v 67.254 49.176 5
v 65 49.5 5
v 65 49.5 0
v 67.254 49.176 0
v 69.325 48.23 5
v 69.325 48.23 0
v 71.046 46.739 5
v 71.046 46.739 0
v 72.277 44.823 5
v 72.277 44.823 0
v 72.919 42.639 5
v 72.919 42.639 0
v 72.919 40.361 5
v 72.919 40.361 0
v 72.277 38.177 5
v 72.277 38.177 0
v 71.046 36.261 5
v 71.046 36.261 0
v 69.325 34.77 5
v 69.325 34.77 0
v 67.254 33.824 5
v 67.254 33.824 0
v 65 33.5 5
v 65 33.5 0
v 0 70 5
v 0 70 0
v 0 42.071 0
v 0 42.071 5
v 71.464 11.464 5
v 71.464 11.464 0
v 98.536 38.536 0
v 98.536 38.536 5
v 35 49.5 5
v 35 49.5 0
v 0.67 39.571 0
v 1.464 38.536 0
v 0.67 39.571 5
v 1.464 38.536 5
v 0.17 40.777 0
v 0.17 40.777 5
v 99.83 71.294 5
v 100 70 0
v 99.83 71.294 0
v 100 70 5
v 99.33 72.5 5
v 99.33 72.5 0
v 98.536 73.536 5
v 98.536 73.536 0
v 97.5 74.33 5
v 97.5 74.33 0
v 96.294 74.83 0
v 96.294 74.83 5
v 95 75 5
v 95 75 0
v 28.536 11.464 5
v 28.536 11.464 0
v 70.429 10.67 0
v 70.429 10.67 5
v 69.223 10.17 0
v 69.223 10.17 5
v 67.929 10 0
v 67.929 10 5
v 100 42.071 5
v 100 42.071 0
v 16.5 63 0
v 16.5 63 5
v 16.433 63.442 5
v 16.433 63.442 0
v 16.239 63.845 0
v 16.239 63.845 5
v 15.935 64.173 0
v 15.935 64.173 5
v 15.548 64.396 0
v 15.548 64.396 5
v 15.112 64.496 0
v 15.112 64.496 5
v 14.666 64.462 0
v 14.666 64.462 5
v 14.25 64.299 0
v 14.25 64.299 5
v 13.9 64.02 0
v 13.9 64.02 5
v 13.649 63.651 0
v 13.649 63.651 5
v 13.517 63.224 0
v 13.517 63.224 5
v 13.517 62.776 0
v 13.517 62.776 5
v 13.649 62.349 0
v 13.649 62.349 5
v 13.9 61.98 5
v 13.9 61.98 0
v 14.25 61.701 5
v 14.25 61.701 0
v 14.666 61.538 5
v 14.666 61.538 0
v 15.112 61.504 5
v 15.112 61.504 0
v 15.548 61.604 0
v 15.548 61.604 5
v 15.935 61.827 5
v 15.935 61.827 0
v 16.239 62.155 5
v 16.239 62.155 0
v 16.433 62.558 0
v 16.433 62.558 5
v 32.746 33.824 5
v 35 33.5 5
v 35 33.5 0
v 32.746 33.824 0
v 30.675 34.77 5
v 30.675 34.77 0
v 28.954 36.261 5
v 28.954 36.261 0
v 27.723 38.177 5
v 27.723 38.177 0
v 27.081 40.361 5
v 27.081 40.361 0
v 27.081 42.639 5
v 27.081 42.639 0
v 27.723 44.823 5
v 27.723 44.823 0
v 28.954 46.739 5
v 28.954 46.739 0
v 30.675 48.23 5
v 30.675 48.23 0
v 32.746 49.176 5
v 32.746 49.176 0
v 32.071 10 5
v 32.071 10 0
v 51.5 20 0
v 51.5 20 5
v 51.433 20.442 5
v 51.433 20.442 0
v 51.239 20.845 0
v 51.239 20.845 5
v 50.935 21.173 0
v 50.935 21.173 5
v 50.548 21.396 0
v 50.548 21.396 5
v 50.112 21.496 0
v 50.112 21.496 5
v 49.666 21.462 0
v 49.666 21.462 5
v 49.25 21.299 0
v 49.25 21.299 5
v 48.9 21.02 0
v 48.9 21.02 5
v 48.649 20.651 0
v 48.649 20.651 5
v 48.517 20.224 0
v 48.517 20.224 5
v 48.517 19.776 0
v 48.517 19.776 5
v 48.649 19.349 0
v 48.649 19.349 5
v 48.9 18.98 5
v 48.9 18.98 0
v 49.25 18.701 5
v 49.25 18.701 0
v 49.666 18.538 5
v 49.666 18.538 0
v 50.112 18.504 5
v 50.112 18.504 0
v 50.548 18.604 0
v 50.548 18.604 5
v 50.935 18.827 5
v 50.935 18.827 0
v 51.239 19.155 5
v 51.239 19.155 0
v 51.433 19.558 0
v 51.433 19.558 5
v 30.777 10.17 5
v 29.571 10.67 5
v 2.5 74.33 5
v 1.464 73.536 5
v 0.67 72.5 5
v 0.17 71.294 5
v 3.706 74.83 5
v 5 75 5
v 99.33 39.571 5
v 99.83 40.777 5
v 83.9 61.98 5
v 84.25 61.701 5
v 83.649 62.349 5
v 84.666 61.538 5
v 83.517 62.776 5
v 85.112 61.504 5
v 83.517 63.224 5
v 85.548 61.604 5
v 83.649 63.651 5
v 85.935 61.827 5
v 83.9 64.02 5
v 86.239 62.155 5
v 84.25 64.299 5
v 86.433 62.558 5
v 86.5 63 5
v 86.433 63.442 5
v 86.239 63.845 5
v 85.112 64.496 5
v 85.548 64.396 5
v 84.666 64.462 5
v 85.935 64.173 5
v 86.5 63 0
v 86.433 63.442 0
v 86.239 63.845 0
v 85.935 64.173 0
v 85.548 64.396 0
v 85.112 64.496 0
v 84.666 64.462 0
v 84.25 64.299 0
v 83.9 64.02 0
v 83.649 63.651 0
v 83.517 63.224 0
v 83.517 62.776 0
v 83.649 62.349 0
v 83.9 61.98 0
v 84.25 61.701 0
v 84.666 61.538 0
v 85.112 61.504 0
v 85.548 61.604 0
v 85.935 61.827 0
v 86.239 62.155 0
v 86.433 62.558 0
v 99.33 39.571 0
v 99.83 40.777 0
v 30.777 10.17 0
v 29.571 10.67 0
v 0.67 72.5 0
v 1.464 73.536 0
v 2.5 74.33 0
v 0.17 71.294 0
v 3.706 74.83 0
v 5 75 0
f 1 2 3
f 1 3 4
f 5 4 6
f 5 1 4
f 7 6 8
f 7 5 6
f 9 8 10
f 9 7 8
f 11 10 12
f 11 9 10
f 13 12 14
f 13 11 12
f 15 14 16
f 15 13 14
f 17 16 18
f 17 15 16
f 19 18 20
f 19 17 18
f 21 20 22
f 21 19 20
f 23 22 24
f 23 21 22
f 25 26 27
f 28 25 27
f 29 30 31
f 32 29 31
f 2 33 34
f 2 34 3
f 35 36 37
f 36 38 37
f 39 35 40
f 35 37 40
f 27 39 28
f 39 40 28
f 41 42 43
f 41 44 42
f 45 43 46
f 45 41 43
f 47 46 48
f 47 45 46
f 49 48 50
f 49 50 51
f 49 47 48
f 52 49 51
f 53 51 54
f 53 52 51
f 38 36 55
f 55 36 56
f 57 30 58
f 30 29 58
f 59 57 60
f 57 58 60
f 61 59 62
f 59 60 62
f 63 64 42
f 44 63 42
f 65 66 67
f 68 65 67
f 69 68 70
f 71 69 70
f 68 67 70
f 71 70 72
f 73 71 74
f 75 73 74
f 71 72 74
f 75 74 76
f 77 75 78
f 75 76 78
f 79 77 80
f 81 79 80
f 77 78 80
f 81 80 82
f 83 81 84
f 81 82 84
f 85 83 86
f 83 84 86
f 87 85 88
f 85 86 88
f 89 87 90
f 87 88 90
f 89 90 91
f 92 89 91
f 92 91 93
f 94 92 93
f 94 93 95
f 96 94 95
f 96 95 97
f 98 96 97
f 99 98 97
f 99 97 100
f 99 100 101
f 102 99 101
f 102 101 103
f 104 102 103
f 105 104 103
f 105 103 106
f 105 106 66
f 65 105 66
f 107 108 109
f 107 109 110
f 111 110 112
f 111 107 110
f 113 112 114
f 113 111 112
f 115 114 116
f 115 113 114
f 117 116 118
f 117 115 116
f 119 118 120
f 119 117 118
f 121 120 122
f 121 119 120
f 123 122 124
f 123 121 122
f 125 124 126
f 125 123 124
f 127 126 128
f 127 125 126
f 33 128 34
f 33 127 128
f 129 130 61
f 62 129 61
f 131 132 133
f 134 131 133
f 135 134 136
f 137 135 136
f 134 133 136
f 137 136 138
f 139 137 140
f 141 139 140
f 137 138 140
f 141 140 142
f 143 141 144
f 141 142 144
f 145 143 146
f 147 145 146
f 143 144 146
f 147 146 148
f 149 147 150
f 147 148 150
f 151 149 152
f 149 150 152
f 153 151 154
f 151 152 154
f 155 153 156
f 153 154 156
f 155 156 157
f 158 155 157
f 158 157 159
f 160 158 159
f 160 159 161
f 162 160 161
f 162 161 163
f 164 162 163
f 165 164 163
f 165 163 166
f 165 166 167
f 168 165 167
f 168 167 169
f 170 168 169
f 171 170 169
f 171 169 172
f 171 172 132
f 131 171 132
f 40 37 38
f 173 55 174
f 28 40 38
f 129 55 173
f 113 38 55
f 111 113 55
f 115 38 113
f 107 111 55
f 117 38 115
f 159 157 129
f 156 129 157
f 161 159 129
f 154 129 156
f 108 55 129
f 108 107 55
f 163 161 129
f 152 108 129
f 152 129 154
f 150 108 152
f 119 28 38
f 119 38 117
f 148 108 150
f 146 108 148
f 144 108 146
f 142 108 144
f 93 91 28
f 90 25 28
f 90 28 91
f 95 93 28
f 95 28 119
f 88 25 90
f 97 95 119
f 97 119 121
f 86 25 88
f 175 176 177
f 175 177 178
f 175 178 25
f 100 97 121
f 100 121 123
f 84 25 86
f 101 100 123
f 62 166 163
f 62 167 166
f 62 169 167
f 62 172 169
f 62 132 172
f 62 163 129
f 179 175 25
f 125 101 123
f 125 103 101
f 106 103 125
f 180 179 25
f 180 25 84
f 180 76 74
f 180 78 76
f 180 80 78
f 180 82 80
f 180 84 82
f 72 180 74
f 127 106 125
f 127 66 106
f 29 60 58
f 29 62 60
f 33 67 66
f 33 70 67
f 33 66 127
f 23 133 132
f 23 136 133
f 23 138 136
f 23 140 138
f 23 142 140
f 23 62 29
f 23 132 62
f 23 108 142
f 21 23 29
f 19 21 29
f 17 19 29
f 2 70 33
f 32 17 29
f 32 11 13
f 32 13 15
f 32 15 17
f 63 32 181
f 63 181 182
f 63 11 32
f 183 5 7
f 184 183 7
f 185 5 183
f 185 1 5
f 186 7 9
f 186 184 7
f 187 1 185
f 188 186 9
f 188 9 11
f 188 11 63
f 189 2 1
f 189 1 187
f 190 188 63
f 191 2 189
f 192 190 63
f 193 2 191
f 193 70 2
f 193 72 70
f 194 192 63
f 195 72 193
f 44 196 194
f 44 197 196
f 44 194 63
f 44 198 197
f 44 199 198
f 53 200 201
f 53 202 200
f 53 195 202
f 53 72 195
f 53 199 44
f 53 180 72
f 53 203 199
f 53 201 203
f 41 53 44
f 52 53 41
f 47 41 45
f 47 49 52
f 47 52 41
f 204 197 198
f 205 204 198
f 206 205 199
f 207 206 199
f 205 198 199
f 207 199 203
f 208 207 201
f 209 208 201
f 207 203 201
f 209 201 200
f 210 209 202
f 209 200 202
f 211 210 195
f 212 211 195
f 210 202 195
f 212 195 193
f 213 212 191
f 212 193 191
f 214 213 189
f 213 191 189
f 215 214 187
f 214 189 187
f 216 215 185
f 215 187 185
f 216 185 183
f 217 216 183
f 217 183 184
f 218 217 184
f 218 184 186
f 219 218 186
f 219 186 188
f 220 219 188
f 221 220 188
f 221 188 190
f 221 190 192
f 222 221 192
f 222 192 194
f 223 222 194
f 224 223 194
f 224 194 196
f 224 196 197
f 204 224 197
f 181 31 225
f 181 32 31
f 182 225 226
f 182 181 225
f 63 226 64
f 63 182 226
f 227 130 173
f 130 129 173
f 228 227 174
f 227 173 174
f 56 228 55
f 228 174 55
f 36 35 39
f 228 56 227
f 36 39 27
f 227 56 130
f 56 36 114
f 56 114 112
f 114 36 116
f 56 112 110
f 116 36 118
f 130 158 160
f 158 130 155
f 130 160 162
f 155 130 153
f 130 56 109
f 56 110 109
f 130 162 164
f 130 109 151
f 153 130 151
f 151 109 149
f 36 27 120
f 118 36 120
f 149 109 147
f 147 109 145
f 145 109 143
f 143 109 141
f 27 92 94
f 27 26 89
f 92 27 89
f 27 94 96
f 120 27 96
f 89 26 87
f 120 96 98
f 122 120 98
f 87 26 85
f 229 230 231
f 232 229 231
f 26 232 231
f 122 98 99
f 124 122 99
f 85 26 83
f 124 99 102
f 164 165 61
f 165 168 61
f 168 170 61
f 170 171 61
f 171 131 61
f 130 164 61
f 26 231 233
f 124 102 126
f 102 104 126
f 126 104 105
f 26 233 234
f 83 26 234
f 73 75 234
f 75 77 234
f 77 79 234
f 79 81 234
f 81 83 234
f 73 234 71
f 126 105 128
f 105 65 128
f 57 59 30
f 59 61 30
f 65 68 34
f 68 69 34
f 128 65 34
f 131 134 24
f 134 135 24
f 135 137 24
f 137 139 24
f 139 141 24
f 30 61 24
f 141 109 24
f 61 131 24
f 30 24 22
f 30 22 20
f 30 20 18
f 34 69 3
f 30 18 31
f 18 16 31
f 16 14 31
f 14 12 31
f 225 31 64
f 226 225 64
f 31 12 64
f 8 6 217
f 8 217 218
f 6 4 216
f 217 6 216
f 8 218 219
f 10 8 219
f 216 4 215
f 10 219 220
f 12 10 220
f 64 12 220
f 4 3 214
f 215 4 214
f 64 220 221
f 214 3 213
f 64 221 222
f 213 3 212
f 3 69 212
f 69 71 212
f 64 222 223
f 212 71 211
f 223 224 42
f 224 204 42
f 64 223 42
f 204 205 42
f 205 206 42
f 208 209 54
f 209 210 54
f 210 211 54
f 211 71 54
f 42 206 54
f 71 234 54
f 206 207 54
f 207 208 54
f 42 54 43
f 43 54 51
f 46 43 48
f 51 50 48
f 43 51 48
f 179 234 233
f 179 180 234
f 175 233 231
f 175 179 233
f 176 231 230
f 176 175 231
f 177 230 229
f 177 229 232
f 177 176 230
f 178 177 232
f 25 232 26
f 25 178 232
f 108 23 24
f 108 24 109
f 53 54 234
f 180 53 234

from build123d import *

# Parameters (mm, degrees)
BOSS_EXTRUDE1_DEPTH = 5
SKETCH3_R           = 1.5
CUT_EXTRUDE3_DEPTH  = 126.099960032
FILLET1_R           = 5
FILLET2_R           = 5
FILLET3_R           = 5
FILLET4_R           = 5
FILLET5_R           = 5
FILLET6_R           = 5


with BuildPart() as part:
    # Sketch1 → Boss-Extrude1 (new body)
    with BuildSketch(Plane.XY):
        Polygon((0, 40), (30, 10), (70, 10), (100, 40), (100, 75), (0, 75), align=None)
    extrude(amount=BOSS_EXTRUDE1_DEPTH)

    # Sketch3 → Cut-Extrude3 (cut, through all)
    with BuildSketch(Plane.XY.offset(5)):
        with Locations((50, 20)):
            Circle(SKETCH3_R)
        with Locations((85, 63)):
            Circle(SKETCH3_R)
        with Locations((15, 63)):
            Circle(SKETCH3_R)
        with BuildLine():
            Line((35, 49.5), (65, 49.5))
            ThreePointArc((65, 49.5), (73, 41.5), (65, 33.5))
            Line((65, 33.5), (35, 33.5))
            ThreePointArc((35, 33.5), (27, 41.5), (35, 49.5))
        make_face()
    extrude(amount=-CUT_EXTRUDE3_DEPTH, mode=Mode.SUBTRACT)

    # Fillet1
    fillet1_edges = [part.edges().sort_by_distance(p)[0] for p in [
        (0, 40, 2.5),
    ]]
    fillet(fillet1_edges, radius=FILLET1_R)

    # Fillet2
    fillet2_edges = [part.edges().sort_by_distance(p)[0] for p in [
        (100, 40, 2.5),
    ]]
    fillet(fillet2_edges, radius=FILLET2_R)

    # Fillet3
    fillet3_edges = [part.edges().sort_by_distance(p)[0] for p in [
        (70, 10, 2.5),
    ]]
    fillet(fillet3_edges, radius=FILLET3_R)

    # Fillet4
    fillet4_edges = [part.edges().sort_by_distance(p)[0] for p in [
        (30, 10, 2.5),
    ]]
    fillet(fillet4_edges, radius=FILLET4_R)

    # Fillet5
    fillet5_edges = [part.edges().sort_by_distance(p)[0] for p in [
        (100, 75, 2.5),
    ]]
    fillet(fillet5_edges, radius=FILLET5_R)

    # Fillet6
    fillet6_edges = [part.edges().sort_by_distance(p)[0] for p in [
        (0, 75, 2.5),
    ]]
    fillet(fillet6_edges, radius=FILLET6_R)


solid = part.part
